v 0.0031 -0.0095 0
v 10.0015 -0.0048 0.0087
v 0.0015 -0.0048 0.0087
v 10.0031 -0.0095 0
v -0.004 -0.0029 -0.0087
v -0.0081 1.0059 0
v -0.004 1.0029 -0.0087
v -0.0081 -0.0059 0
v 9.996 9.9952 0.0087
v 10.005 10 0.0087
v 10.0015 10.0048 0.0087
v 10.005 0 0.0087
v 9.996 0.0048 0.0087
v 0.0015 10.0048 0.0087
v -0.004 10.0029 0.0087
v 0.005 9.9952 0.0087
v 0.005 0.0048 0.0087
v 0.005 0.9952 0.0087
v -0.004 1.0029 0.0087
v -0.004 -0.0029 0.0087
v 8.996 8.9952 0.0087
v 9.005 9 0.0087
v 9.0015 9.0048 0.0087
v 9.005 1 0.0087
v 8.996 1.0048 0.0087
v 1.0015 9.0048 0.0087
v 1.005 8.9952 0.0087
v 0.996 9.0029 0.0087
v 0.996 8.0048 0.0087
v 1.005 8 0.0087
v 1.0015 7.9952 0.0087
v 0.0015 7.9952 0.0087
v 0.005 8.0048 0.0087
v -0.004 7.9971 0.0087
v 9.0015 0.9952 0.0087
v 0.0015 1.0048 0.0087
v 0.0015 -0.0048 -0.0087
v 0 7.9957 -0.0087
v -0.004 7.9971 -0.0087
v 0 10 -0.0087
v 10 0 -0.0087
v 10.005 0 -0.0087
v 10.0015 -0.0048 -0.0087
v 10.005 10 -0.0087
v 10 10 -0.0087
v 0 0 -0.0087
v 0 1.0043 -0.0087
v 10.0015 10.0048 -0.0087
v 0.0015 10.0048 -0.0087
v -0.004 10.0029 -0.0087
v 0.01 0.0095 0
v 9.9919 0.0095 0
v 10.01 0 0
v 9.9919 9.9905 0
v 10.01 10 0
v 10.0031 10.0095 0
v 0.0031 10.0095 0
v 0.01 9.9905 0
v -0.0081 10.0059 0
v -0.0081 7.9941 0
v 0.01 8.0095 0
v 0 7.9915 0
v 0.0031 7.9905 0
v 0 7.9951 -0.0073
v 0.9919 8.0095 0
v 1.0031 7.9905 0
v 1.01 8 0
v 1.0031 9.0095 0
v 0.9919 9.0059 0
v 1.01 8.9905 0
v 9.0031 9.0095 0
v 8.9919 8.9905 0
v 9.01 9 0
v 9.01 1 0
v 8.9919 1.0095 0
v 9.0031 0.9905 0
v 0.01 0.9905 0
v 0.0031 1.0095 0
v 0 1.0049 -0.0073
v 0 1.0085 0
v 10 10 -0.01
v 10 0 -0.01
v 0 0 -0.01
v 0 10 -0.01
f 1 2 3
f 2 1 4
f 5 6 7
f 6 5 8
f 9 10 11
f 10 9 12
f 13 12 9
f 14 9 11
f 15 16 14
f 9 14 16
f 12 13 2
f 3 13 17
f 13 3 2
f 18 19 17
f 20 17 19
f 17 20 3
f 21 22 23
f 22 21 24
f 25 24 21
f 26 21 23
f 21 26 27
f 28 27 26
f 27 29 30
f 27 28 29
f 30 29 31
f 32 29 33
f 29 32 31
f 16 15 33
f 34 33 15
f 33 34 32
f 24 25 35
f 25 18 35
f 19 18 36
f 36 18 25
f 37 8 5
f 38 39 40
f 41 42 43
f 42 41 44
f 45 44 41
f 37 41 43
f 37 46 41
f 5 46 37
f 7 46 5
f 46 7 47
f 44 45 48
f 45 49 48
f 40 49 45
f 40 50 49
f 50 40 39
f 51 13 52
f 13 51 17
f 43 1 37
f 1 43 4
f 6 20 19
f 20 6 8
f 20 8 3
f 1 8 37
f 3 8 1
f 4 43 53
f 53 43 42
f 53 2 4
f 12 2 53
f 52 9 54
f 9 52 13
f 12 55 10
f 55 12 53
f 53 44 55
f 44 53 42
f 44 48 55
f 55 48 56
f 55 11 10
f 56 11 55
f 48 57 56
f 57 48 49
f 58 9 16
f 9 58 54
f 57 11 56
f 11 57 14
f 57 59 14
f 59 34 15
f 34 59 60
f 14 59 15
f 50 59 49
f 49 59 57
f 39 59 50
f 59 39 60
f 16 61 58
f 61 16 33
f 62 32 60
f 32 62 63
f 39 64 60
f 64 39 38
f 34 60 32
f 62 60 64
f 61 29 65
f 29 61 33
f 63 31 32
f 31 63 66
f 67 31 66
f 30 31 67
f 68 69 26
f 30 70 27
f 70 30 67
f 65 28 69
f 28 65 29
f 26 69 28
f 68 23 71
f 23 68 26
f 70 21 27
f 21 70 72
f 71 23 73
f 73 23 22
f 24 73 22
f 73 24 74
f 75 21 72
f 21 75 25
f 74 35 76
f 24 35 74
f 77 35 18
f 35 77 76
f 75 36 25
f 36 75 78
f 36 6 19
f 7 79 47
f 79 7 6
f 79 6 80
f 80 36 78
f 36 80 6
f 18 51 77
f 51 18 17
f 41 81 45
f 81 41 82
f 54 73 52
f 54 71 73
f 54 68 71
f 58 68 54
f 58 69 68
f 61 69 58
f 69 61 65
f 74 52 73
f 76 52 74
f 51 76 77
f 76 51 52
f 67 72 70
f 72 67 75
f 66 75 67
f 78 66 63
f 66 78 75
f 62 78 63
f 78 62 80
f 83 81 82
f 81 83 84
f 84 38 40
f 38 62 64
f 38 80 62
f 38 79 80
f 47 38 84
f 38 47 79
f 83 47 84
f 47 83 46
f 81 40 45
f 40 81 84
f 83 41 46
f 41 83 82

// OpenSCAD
hull(){
    translate([0, 0]) sphere(0.01);
    translate([1, 0]) sphere(0.01);
}
hull(){
    translate([1, 0]) sphere(0.01);
    translate([2, 0]) sphere(0.01);
}
hull(){
    translate([2, 0]) sphere(0.01);
    translate([3, 0]) sphere(0.01);
}
hull(){
    translate([3, 0]) sphere(0.01);
    translate([4, 0]) sphere(0.01);
}
hull(){
    translate([4, 0]) sphere(0.01);
    translate([5, 0]) sphere(0.01);
}
hull(){
    translate([5, 0]) sphere(0.01);
    translate([6, 0]) sphere(0.01);
}
hull(){
    translate([6, 0]) sphere(0.01);
    translate([7, 0]) sphere(0.01);
}
hull(){
    translate([7, 0]) sphere(0.01);
    translate([8, 0]) sphere(0.01);
}
hull(){
    translate([8, 0]) sphere(0.01);
    translate([9, 0]) sphere(0.01);
}
hull(){
    translate([9, 0]) sphere(0.01);
    translate([10, 0]) sphere(0.01);
}
hull(){
    translate([10, 0]) sphere(0.01);
    translate([10, 1]) sphere(0.01);
}
hull(){
    translate([10, 1]) sphere(0.01);
    translate([10, 2]) sphere(0.01);
}
hull(){
    translate([10, 2]) sphere(0.01);
    translate([10, 3]) sphere(0.01);
}
hull(){
    translate([10, 3]) sphere(0.01);
    translate([10, 4]) sphere(0.01);
}
hull(){
    translate([10, 4]) sphere(0.01);
    translate([10, 5]) sphere(0.01);
}
hull(){
    translate([10, 5]) sphere(0.01);
    translate([10, 6]) sphere(0.01);
}
hull(){
    translate([10, 6]) sphere(0.01);
    translate([10, 7]) sphere(0.01);
}
hull(){
    translate([10, 7]) sphere(0.01);
    translate([10, 8]) sphere(0.01);
}
hull(){
    translate([10, 8]) sphere(0.01);
    translate([10, 9]) sphere(0.01);
}
hull(){
    translate([10, 9]) sphere(0.01);
    translate([10, 10]) sphere(0.01);
}
hull(){
    translate([10, 10]) sphere(0.01);
    translate([9, 10]) sphere(0.01);
}
hull(){
    translate([9, 10]) sphere(0.01);
    translate([8, 10]) sphere(0.01);
}
hull(){
    translate([8, 10]) sphere(0.01);
    translate([7, 10]) sphere(0.01);
}
hull(){
    translate([7, 10]) sphere(0.01);
    translate([6, 10]) sphere(0.01);
}
hull(){
    translate([6, 10]) sphere(0.01);
    translate([5, 10]) sphere(0.01);
}
hull(){
    translate([5, 10]) sphere(0.01);
    translate([4, 10]) sphere(0.01);
}
hull(){
    translate([4, 10]) sphere(0.01);
    translate([3, 10]) sphere(0.01);
}
hull(){
    translate([3, 10]) sphere(0.01);
    translate([2, 10]) sphere(0.01);
}
hull(){
    translate([2, 10]) sphere(0.01);
    translate([1, 10]) sphere(0.01);
}
hull(){
    translate([1, 10]) sphere(0.01);
    translate([0, 10]) sphere(0.01);
}
hull(){
    translate([0, 10]) sphere(0.01);
    translate([0, 9]) sphere(0.01);
}
hull(){
    translate([0, 9]) sphere(0.01);
    translate([0, 8]) sphere(0.01);
}
hull(){
    translate([0, 8]) sphere(0.01);
    translate([1, 8]) sphere(0.01);
}
hull(){
    translate([1, 8]) sphere(0.01);
    translate([1, 9]) sphere(0.01);
}
hull(){
    translate([1, 9]) sphere(0.01);
    translate([2, 9]) sphere(0.01);
}
hull(){
    translate([2, 9]) sphere(0.01);
    translate([3, 9]) sphere(0.01);
}
hull(){
    translate([3, 9]) sphere(0.01);
    translate([4, 9]) sphere(0.01);
}
hull(){
    translate([4, 9]) sphere(0.01);
    translate([5, 9]) sphere(0.01);
}
hull(){
    translate([5, 9]) sphere(0.01);
    translate([6, 9]) sphere(0.01);
}
hull(){
    translate([6, 9]) sphere(0.01);
    translate([7, 9]) sphere(0.01);
}
hull(){
    translate([7, 9]) sphere(0.01);
    translate([8, 9]) sphere(0.01);
}
hull(){
    translate([8, 9]) sphere(0.01);
    translate([9, 9]) sphere(0.01);
}
hull(){
    translate([9, 9]) sphere(0.01);
    translate([9, 8]) sphere(0.01);
}
hull(){
    translate([9, 8]) sphere(0.01);
    translate([9, 7]) sphere(0.01);
}
hull(){
    translate([9, 7]) sphere(0.01);
    translate([9, 6]) sphere(0.01);
}
hull(){
    translate([9, 6]) sphere(0.01);
    translate([9, 5]) sphere(0.01);
}
hull(){
    translate([9, 5]) sphere(0.01);
    translate([9, 4]) sphere(0.01);
}
hull(){
    translate([9, 4]) sphere(0.01);
    translate([9, 3]) sphere(0.01);
}
hull(){
    translate([9, 3]) sphere(0.01);
    translate([9, 2]) sphere(0.01);
}
hull(){
    translate([9, 2]) sphere(0.01);
    translate([9, 1]) sphere(0.01);
}
hull(){
    translate([9, 1]) sphere(0.01);
    translate([8, 1]) sphere(0.01);
}
hull(){
    translate([8, 1]) sphere(0.01);
    translate([7, 1]) sphere(0.01);
}
hull(){
    translate([7, 1]) sphere(0.01);
    translate([6, 1]) sphere(0.01);
}
hull(){
    translate([6, 1]) sphere(0.01);
    translate([5, 1]) sphere(0.01);
}
hull(){
    translate([5, 1]) sphere(0.01);
    translate([4, 1]) sphere(0.01);
}
hull(){
    translate([4, 1]) sphere(0.01);
    translate([3, 1]) sphere(0.01);
}
hull(){
    translate([3, 1]) sphere(0.01);
    translate([2, 1]) sphere(0.01);
}
hull(){
    translate([2, 1]) sphere(0.01);
    translate([1, 1]) sphere(0.01);
}
hull(){
    translate([1, 1]) sphere(0.01);
    translate([0, 1]) sphere(0.01);
}
hull(){
    translate([0, 1]) sphere(0.01);
    translate([0, 0]) sphere(0.01);
}
translate([0,0,-0.01]) color([0.1,0.1,0.1]) cube([10,10,0.01]);
